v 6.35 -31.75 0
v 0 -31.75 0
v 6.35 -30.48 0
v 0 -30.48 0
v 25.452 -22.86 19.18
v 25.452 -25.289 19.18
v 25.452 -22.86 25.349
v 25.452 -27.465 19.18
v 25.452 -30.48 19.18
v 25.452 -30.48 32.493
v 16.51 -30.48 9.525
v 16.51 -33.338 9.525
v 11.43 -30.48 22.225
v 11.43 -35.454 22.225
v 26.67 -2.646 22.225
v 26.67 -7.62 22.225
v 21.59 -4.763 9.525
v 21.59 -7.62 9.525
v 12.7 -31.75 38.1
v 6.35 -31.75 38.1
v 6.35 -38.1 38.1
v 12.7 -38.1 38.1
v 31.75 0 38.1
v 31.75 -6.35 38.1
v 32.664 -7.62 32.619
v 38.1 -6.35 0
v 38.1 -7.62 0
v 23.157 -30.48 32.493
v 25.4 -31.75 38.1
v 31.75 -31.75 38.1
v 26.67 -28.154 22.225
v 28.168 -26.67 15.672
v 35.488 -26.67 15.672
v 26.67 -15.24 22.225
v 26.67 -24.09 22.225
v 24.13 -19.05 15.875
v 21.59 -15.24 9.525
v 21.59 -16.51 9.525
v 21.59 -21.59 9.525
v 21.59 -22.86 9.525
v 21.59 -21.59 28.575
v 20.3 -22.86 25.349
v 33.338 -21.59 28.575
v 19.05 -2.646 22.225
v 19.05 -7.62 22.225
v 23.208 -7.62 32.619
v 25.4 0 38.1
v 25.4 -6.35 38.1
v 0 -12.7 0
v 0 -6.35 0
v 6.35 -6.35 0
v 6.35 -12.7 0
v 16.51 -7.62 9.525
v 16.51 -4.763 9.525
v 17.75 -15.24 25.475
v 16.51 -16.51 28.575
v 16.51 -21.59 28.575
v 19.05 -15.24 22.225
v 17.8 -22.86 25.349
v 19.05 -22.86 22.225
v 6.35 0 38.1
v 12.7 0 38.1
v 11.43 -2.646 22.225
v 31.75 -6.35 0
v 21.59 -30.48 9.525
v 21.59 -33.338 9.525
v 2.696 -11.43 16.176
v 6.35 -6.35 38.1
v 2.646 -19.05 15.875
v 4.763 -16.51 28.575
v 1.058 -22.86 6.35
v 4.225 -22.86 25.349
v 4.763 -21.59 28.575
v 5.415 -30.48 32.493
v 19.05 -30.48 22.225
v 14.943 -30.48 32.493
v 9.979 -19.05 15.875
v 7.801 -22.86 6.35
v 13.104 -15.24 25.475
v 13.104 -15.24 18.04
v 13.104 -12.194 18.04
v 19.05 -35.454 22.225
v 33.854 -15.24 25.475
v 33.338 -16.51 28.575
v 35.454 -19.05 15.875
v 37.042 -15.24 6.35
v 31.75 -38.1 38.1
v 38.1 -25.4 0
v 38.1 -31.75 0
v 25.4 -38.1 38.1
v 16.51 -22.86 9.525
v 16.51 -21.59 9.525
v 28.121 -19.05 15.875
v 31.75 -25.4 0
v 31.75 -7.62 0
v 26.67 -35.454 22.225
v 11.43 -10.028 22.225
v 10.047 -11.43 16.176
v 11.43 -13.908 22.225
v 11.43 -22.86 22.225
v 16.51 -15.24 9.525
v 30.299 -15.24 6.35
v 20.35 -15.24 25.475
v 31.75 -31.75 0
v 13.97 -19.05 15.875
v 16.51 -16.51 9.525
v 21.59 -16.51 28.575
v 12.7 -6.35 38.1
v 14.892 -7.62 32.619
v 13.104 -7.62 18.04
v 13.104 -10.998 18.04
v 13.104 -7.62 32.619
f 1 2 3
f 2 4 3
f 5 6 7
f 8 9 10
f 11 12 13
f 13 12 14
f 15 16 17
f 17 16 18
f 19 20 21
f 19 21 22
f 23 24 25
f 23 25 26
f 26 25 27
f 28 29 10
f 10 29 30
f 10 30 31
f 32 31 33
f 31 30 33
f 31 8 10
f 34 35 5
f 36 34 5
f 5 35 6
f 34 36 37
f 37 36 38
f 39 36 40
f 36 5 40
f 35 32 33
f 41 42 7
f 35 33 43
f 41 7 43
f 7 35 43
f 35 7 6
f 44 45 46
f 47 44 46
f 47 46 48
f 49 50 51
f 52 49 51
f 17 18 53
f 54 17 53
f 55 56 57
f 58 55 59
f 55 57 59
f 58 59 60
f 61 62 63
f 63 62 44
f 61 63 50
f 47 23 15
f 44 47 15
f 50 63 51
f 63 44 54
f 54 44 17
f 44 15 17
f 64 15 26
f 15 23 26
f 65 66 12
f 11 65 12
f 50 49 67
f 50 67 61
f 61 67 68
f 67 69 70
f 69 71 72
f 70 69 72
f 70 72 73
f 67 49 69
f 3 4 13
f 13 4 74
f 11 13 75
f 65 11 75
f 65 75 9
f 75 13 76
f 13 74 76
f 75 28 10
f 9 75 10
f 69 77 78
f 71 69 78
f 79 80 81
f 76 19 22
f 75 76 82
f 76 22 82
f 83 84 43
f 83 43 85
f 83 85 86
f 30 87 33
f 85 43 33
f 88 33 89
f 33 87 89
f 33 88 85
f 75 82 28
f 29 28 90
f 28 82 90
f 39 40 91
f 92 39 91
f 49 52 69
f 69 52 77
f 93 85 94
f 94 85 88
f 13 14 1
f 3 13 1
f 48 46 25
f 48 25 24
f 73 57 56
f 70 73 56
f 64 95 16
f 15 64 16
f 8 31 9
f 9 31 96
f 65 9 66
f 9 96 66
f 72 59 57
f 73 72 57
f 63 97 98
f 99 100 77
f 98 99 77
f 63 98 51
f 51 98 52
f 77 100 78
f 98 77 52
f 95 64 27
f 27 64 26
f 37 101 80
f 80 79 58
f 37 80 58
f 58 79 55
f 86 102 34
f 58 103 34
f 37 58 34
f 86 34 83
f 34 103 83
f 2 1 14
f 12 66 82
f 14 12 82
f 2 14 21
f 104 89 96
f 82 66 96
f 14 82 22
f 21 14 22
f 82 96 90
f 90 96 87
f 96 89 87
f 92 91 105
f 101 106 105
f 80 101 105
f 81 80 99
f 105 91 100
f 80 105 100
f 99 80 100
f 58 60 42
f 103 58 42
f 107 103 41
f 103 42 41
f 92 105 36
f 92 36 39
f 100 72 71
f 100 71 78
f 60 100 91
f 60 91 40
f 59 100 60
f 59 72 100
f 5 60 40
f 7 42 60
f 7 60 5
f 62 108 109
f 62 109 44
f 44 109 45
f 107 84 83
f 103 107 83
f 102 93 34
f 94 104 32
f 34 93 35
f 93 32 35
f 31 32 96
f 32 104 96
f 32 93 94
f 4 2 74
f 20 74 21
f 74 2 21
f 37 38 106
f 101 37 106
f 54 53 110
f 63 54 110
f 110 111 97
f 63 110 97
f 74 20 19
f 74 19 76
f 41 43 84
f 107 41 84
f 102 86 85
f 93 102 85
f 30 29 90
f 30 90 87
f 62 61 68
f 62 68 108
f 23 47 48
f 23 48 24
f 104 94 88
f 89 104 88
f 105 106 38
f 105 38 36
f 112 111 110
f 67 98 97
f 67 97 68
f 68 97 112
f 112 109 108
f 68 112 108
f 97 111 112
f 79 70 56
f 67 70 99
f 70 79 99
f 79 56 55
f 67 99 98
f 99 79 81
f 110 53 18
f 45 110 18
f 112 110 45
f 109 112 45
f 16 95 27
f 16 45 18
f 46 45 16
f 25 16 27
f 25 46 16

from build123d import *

# Parameters (mm, degrees)
F0_W      = 38.1
F0_H      = 38.1
F1_DEPTH  = 38.1
F6_DEPTH  = 38.1
F8_DEPTH  = 38.1
F9_W      = 24.996
F9_H      = 7.62
F9_W_2    = 25.452001
F10_DEPTH = 38.1


with BuildPart() as f1:
    # F0 (on Front) → F1 (new body)
    with BuildSketch(Plane.XZ):
        with Locations((19.05, 19.05)):
            Rectangle(F0_W, F0_H)
    extrude(amount=F1_DEPTH)

    # F5 (on offset) → F6 (cut)
    with BuildSketch(Plane.YZ.offset(38.1)):
        Polygon((-6.35, 38.1), (-31.75, 38.1), (-26.67, 15.671999), (-21.59, 28.575), (-16.51, 28.575), (-11.43, 16.175999), align=None)
        Polygon((-19.05, 15.875), (-25.4, 0), (-12.7, 0), align=None)
        Polygon((-31.75, 0), (-38.1, 38.1), (-38.1, 0), align=None)
        Polygon((0, 0), (0, 38.1), (-6.35, 0), align=None)
    extrude(amount=-F6_DEPTH, mode=Mode.SUBTRACT)

    # F7 (on offset) → F8 (cut)
    with BuildSketch(Plane.XZ.offset(38.1)):
        Polygon((25.4, 38.1), (12.7, 38.1), (19.05, 22.225), align=None)
        Polygon((0, 38.1), (0, 0), (6.35, 38.1), align=None)
        Polygon((11.43, 22.225), (6.35, 0), (31.75, 0), (26.67, 22.225), (21.59, 9.525), (16.51, 9.525), align=None)
        Polygon((31.75, 38.1), (38.1, 0), (38.1, 38.1), align=None)
    extrude(amount=-F8_DEPTH, mode=Mode.SUBTRACT)

    # F9 (on offset) → F10 (cut)
    with BuildSketch(Plane.XY.offset(38.1)):
        with Locations((25.602, -11.43)):
            Rectangle(F9_W, F9_H)
        with Locations((12.726, -26.67)):
            Rectangle(F9_W_2, F9_H)
    extrude(amount=-F10_DEPTH, mode=Mode.SUBTRACT)


solid = f1.part
